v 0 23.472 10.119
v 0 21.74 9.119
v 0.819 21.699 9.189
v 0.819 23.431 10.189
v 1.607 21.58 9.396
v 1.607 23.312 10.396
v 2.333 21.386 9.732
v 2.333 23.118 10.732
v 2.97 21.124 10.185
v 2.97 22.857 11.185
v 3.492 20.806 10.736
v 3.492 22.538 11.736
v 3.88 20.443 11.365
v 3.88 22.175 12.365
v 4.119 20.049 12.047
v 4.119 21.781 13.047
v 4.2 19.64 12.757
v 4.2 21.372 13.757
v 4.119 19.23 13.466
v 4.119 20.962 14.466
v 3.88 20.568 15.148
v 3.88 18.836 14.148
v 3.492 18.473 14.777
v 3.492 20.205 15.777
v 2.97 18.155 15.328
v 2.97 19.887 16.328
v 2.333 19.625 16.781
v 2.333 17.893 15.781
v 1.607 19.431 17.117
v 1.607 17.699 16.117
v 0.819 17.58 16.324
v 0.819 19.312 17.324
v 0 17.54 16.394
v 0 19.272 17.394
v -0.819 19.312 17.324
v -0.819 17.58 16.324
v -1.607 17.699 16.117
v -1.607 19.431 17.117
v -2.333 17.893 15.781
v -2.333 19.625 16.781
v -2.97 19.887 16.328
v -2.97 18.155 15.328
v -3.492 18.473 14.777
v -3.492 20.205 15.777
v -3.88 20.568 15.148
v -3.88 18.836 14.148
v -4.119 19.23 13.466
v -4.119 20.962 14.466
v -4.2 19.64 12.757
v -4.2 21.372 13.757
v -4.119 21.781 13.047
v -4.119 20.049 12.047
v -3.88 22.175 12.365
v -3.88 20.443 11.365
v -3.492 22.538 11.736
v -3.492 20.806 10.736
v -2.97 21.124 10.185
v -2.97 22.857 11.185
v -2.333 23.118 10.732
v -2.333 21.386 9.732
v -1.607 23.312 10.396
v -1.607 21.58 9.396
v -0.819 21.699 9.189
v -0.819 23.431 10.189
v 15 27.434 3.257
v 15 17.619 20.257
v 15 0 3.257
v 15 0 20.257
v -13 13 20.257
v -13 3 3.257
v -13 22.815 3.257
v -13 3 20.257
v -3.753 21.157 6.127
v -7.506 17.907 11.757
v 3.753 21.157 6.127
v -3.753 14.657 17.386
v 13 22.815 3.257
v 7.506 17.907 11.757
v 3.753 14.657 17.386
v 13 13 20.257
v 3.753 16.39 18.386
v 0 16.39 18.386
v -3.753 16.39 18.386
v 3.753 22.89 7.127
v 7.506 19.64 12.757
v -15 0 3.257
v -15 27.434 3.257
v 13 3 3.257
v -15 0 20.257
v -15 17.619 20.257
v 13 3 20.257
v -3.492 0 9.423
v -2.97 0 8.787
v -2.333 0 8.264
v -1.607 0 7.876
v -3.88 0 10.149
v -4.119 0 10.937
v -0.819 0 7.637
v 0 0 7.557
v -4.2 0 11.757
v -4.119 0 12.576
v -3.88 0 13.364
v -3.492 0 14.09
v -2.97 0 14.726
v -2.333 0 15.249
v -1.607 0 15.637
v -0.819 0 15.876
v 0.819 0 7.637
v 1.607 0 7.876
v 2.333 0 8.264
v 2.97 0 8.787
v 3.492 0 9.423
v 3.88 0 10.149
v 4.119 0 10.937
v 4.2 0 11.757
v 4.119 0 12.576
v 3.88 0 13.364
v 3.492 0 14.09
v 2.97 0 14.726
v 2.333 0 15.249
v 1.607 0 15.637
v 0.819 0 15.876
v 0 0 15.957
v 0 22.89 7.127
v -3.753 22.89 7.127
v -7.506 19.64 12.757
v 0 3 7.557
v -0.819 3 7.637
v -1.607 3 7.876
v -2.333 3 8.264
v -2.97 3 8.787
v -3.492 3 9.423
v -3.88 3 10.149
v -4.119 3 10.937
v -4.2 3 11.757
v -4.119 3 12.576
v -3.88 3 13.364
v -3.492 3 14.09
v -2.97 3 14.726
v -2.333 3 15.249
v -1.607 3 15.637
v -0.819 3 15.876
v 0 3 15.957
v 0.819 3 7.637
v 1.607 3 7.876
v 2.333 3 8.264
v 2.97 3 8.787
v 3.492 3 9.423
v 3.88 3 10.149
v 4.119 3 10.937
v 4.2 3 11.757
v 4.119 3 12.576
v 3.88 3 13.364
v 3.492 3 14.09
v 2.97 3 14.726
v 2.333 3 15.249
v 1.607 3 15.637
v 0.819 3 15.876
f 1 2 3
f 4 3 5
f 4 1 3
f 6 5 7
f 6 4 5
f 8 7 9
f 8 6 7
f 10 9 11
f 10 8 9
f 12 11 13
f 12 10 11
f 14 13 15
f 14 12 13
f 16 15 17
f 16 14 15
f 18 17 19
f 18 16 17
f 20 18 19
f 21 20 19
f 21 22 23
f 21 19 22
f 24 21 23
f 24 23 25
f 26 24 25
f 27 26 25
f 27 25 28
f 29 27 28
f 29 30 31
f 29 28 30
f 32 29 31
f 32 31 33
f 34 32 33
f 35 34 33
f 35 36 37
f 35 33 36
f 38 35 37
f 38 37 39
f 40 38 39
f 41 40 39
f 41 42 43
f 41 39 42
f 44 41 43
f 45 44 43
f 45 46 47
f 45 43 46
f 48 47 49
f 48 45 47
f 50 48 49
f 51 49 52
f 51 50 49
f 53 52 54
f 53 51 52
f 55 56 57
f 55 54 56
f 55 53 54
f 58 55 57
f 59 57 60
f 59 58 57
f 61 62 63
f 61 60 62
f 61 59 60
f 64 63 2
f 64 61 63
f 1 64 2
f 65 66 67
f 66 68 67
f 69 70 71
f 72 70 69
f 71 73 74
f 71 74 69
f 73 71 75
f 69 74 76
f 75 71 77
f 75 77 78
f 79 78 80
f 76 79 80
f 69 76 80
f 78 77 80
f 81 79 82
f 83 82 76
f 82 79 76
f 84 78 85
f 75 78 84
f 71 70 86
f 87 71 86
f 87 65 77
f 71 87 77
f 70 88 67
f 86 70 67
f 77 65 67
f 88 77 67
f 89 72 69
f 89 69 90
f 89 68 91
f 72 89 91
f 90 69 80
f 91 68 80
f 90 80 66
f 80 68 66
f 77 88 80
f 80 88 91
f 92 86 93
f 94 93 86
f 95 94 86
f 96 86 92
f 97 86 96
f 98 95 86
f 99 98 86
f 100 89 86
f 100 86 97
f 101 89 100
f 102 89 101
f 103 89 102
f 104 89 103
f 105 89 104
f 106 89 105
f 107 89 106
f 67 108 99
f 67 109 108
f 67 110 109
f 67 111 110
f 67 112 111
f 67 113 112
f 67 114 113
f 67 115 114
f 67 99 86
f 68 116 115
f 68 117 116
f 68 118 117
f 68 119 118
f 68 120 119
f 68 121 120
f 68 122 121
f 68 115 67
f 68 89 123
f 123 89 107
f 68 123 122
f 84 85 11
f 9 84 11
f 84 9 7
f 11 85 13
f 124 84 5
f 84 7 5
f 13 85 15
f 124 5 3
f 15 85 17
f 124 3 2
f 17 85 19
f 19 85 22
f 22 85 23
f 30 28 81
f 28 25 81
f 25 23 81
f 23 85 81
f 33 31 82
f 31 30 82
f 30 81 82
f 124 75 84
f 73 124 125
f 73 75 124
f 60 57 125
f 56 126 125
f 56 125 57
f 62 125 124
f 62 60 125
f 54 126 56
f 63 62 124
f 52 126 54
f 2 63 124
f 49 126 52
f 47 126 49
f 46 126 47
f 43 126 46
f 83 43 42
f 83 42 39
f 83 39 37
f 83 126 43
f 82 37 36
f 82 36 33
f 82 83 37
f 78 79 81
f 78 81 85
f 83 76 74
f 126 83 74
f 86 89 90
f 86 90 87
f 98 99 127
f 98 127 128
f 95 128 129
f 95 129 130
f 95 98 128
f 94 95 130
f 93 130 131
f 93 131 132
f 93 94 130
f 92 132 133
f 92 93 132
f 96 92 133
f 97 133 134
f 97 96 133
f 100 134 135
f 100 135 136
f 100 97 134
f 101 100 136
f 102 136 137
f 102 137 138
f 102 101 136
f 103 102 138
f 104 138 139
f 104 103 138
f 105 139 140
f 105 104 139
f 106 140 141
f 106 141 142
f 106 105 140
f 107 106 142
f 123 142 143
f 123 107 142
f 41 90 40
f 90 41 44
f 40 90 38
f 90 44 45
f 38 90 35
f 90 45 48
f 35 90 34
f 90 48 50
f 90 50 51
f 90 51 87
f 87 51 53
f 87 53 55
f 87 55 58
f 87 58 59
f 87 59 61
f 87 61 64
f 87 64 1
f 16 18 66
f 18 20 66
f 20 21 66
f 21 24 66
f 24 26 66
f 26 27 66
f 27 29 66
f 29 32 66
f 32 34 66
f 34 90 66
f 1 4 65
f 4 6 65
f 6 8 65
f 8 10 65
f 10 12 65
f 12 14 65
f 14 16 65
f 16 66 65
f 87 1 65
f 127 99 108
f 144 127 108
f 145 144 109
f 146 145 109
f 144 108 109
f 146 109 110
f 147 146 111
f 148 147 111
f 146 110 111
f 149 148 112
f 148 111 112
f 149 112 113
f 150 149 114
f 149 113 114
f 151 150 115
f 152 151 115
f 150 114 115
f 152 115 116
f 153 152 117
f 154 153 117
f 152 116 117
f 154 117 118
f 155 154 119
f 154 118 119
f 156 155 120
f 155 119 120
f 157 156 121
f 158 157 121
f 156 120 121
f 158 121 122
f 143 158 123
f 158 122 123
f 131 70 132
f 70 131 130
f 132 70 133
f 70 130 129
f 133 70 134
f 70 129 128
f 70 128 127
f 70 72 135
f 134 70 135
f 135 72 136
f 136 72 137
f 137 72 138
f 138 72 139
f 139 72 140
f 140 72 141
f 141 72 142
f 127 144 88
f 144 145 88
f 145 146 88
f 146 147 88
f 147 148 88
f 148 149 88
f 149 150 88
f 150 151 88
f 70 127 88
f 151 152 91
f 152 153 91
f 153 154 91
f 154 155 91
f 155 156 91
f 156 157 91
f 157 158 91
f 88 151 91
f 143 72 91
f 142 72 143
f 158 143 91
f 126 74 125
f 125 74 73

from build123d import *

# Parameters (mm, degrees)
PAD015_DEPTH    = 3
PAD016_DEPTH    = 2
PAD017_DEPTH    = 15
POCKET009_DEPTH = 5
POCKET010_DEPTH = 2


with BuildPart() as part:
    # Sketch031 → Pad015 (new body)
    with BuildSketch(Plane(origin=(0, 0, 0), x_dir=(-1, 0, 0), z_dir=(0, 1, 0))):
        with BuildLine():
            Line((15, 3.2565168385), (15, 20.2565168385))
            Line((15, 20.2565168385), (0, 20.2565168385))
            Line((0, 20.2565168385), (0, 15.9565168385))
            ThreePointArc((0, 7.5565168385), (4.2, 11.7565168385), (0, 15.9565168385))
            Line((0, 7.5565168385), (0, 3.2565168385))
            Line((0, 3.2565168385), (15, 3.2565168385))
        make_face()
    pad015 = extrude(amount=PAD015_DEPTH)

    # Sketch032 (on Face3 of Pad015) → Pad016 (join)
    with BuildSketch(Plane(origin=(-15, 0, 0), x_dir=(0, 0, -1), z_dir=(-1, 0, 0))):
        Polygon((-3.2565168385, -3), (-3.2565168385, -22.8149545762), (-20.2565168385, -13), (-20.2565168385, -3), align=None)
    pad016 = extrude(amount=-PAD016_DEPTH)

    # Sketch034 (on Face11 of Pad016) → Pad017 (join)
    with BuildSketch(Plane(origin=(-15, 0, 0), x_dir=(0, 0, -1), z_dir=(-1, 0, 0))):
        Polygon((-20.2565168385, -13), (-20.2565168385, -17.6188021535), (-3.2565168385, -27.4337567297), (-3.2565168385, -22.8149545762), align=None)
    pad017 = extrude(amount=-PAD017_DEPTH)

    # Sketch035 (on Face16 of Pad017) → Pocket009 (cut)
    with BuildSketch(Plane(origin=(0, 21.9854307023, 12.6932943342), x_dir=(1, 0, 0), z_dir=(0, 0.8660254038, 0.5))):
        with BuildLine():
            ThreePointArc((0, 2.9722964019), (-4.2, -1.2277035981), (0, -5.4277035981))
            Line((0, -5.4277035981), (0, 2.9722964019))
        make_face()
    pocket009 = extrude(amount=-POCKET009_DEPTH, mode=Mode.SUBTRACT)

    # Sketch036 (on Face14 of Pocket009) → Pocket010 (cut)
    with BuildSketch(Plane(origin=(0, 18.5213290872, 10.6932943342), x_dir=(1, 0, 0), z_dir=(0, -0.8660254038, -0.5))):
        Polygon((3.7527767497, 7.7277035981), (-3.7527767497, 7.7277035981), (-7.5055534995, 1.2277035981), (-3.7527767497, -5.2722964019), (3.7527767497, -5.2722964019), (7.5055534995, 1.2277035981), align=None)
    pocket010 = extrude(amount=-POCKET010_DEPTH, mode=Mode.SUBTRACT)

    # Mirrored008: Pad015, Pad016, Pad017, Pocket009, Pocket010 across Sketch031 V_Axis
    add(pad015.mirror(Plane(origin=(0, 0, 0), x_dir=(0, 1, 0), z_dir=(-1, 0, 0))))
    add(pad016.mirror(Plane(origin=(0, 0, 0), x_dir=(0, 1, 0), z_dir=(-1, 0, 0))))
    add(pad017.mirror(Plane(origin=(0, 0, 0), x_dir=(0, 1, 0), z_dir=(-1, 0, 0))))
    add(pocket009.mirror(Plane(origin=(0, 0, 0), x_dir=(0, 1, 0), z_dir=(-1, 0, 0))), mode=Mode.SUBTRACT)
    add(pocket010.mirror(Plane(origin=(0, 0, 0), x_dir=(0, 1, 0), z_dir=(-1, 0, 0))), mode=Mode.SUBTRACT)


solid = part.part
